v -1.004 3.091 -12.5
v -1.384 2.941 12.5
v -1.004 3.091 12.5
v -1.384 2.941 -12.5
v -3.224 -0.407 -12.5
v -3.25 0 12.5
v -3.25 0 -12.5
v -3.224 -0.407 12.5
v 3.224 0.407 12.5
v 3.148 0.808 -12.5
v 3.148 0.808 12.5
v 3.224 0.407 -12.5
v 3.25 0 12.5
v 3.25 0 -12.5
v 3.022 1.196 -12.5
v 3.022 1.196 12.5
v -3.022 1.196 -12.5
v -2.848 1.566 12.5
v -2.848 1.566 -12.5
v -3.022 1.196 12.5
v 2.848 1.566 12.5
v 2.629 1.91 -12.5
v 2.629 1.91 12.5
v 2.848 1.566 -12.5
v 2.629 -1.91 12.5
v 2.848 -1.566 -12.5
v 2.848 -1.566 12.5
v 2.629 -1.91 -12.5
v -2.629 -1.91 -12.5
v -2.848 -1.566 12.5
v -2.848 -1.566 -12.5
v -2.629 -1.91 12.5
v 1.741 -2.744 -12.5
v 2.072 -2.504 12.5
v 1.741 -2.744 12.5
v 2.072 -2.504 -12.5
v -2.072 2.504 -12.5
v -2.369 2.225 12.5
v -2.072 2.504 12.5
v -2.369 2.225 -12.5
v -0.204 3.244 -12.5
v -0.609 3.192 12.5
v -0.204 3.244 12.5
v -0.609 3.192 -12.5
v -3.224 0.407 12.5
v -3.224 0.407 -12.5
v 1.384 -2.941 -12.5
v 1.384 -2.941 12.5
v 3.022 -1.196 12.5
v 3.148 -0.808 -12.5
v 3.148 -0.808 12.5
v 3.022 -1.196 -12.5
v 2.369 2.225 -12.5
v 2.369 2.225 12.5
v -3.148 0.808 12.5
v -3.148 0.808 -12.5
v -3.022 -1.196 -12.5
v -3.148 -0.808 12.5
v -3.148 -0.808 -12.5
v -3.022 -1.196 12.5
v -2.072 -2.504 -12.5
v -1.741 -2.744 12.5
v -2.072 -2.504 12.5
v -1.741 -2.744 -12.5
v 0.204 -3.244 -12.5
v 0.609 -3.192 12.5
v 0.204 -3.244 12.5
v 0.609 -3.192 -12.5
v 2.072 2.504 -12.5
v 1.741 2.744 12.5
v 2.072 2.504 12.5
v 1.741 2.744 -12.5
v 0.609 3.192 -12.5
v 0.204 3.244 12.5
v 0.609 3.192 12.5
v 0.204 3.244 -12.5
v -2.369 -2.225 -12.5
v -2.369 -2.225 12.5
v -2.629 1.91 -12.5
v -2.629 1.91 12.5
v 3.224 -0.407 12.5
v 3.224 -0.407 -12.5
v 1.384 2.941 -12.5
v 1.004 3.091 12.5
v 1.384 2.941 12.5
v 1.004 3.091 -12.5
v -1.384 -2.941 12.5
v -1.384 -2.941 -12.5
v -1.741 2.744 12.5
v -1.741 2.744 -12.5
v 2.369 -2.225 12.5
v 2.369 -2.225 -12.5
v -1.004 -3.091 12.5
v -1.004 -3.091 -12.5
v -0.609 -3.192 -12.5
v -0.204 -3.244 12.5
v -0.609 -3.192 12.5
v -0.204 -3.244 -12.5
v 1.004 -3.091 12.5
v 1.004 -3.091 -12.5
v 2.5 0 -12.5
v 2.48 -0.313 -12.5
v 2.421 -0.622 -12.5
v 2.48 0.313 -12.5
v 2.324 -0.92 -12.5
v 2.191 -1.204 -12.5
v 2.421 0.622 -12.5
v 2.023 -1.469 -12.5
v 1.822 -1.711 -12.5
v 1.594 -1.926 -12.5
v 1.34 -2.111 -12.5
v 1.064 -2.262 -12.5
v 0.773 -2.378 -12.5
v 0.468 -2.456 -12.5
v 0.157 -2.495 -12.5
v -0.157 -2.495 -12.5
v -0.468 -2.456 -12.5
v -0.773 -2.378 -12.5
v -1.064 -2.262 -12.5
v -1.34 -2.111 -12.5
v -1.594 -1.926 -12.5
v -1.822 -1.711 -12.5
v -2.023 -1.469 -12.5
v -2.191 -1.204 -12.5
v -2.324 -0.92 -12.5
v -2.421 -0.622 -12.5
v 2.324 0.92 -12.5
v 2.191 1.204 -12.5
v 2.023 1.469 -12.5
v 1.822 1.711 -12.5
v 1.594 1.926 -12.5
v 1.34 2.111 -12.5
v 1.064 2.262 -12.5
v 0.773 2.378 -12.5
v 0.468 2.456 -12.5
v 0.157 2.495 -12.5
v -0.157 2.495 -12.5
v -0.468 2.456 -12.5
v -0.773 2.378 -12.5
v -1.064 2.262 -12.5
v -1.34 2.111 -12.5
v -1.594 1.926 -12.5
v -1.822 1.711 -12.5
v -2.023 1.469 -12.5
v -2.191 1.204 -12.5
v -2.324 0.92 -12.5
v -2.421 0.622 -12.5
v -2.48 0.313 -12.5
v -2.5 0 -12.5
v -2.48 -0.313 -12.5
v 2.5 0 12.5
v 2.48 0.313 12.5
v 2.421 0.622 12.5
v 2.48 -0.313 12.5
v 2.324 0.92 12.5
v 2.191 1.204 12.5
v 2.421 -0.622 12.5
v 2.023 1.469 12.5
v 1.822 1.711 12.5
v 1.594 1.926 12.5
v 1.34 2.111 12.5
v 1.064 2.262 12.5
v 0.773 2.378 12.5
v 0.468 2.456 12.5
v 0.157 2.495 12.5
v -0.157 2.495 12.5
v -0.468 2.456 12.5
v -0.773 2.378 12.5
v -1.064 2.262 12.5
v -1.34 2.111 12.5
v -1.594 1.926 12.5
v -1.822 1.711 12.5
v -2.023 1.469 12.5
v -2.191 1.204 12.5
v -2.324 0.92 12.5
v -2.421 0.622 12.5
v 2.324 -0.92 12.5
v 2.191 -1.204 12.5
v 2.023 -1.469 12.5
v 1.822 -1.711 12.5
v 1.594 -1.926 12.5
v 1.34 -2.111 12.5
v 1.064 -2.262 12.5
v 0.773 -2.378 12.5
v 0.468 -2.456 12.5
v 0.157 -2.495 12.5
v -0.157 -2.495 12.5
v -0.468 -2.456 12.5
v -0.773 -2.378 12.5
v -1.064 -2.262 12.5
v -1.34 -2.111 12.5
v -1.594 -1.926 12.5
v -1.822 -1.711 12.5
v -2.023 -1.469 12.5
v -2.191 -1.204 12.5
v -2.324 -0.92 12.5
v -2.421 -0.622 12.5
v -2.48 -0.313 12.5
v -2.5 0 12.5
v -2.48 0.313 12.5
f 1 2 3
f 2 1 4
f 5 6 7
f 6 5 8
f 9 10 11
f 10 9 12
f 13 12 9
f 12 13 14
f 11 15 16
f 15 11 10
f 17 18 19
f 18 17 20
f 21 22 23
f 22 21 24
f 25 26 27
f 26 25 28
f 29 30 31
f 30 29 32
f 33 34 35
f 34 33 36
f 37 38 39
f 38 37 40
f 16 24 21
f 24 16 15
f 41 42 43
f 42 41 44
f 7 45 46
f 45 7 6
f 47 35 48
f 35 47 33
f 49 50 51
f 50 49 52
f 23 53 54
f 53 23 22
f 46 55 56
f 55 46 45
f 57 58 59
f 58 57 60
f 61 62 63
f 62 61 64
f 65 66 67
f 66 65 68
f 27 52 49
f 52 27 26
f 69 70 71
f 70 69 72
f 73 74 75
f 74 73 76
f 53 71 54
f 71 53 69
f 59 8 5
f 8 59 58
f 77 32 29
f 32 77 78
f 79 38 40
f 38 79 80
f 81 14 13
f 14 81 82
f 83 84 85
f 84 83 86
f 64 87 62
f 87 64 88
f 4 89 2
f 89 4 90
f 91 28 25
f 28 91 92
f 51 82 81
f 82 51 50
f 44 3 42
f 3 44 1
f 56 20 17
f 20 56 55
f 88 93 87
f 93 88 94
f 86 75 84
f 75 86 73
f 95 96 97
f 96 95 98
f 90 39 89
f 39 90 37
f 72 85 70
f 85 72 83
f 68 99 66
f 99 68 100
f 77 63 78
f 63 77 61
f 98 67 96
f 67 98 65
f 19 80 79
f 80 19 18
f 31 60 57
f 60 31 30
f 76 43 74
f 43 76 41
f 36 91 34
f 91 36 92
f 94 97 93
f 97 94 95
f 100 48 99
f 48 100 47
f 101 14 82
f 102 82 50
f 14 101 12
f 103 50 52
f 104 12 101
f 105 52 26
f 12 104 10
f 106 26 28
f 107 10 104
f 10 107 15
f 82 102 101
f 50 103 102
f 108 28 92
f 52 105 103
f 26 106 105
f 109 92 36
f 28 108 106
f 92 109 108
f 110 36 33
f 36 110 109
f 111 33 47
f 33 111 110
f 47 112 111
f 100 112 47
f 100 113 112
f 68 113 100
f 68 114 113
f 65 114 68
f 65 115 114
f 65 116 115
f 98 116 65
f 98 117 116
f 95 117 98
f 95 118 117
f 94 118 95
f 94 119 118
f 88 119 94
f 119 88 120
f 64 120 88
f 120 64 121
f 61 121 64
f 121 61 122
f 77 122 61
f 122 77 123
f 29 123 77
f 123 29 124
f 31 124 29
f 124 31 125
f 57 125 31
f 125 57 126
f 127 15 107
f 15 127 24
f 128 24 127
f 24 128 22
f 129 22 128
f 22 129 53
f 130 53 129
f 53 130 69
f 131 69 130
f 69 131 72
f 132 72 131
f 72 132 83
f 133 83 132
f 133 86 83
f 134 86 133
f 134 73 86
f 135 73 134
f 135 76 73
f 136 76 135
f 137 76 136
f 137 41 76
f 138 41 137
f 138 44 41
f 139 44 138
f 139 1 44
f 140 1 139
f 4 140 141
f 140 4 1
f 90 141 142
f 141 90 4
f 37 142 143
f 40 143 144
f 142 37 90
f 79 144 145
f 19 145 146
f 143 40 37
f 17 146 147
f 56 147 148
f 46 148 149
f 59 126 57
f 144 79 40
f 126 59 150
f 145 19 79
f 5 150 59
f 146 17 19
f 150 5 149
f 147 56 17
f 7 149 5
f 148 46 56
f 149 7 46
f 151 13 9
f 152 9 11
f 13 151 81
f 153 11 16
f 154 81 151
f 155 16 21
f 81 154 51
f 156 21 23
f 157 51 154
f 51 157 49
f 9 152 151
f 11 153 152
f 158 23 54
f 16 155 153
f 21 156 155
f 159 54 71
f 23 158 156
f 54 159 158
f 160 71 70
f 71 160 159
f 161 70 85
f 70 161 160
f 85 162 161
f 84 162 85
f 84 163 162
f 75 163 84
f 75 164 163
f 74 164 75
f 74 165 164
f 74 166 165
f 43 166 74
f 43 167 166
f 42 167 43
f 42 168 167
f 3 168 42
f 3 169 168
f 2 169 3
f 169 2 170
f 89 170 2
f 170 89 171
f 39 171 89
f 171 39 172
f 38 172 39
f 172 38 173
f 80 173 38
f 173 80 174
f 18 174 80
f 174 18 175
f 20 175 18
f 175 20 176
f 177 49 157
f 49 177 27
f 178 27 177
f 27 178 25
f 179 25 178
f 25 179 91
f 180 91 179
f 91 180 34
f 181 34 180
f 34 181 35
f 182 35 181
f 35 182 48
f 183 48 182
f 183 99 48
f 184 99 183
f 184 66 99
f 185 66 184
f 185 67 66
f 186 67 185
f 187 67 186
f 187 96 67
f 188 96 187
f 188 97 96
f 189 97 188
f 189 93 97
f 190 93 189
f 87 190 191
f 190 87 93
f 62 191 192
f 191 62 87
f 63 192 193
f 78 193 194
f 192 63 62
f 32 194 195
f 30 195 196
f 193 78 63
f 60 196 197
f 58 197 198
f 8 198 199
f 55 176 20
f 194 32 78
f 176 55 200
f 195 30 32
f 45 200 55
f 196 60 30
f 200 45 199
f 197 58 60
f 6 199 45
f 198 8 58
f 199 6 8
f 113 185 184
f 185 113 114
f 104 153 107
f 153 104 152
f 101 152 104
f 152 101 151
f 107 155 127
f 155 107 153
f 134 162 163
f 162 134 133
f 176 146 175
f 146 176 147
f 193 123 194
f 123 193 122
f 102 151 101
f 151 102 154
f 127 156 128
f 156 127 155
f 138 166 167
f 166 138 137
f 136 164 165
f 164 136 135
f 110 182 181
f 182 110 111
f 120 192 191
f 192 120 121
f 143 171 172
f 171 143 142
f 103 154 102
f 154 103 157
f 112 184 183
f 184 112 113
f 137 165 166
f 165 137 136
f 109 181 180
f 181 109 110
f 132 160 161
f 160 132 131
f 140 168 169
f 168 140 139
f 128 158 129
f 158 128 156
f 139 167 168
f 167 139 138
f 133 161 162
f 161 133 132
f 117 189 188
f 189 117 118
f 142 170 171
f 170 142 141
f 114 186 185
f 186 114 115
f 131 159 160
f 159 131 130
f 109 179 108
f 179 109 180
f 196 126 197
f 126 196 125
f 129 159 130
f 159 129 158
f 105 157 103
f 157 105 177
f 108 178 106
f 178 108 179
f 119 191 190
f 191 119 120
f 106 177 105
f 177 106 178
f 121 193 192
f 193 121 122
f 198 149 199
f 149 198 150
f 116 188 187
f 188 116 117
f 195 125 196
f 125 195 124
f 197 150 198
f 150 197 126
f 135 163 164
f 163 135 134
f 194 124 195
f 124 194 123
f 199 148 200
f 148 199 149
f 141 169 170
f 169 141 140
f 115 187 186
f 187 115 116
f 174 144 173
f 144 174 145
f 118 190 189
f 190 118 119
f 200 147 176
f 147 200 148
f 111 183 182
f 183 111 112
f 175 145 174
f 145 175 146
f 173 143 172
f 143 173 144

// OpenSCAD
$fn = 50;


difference() {
	union() {
		translate(v = [0, 0, -12.5000000000]) {
			cylinder(h = 25, r = 3.2500000000);
		}
	}
	union() {
		translate(v = [0, 0, -100.0000000000]) {
			cylinder(h = 200, r = 2.5000000000);
		}
	}
}
